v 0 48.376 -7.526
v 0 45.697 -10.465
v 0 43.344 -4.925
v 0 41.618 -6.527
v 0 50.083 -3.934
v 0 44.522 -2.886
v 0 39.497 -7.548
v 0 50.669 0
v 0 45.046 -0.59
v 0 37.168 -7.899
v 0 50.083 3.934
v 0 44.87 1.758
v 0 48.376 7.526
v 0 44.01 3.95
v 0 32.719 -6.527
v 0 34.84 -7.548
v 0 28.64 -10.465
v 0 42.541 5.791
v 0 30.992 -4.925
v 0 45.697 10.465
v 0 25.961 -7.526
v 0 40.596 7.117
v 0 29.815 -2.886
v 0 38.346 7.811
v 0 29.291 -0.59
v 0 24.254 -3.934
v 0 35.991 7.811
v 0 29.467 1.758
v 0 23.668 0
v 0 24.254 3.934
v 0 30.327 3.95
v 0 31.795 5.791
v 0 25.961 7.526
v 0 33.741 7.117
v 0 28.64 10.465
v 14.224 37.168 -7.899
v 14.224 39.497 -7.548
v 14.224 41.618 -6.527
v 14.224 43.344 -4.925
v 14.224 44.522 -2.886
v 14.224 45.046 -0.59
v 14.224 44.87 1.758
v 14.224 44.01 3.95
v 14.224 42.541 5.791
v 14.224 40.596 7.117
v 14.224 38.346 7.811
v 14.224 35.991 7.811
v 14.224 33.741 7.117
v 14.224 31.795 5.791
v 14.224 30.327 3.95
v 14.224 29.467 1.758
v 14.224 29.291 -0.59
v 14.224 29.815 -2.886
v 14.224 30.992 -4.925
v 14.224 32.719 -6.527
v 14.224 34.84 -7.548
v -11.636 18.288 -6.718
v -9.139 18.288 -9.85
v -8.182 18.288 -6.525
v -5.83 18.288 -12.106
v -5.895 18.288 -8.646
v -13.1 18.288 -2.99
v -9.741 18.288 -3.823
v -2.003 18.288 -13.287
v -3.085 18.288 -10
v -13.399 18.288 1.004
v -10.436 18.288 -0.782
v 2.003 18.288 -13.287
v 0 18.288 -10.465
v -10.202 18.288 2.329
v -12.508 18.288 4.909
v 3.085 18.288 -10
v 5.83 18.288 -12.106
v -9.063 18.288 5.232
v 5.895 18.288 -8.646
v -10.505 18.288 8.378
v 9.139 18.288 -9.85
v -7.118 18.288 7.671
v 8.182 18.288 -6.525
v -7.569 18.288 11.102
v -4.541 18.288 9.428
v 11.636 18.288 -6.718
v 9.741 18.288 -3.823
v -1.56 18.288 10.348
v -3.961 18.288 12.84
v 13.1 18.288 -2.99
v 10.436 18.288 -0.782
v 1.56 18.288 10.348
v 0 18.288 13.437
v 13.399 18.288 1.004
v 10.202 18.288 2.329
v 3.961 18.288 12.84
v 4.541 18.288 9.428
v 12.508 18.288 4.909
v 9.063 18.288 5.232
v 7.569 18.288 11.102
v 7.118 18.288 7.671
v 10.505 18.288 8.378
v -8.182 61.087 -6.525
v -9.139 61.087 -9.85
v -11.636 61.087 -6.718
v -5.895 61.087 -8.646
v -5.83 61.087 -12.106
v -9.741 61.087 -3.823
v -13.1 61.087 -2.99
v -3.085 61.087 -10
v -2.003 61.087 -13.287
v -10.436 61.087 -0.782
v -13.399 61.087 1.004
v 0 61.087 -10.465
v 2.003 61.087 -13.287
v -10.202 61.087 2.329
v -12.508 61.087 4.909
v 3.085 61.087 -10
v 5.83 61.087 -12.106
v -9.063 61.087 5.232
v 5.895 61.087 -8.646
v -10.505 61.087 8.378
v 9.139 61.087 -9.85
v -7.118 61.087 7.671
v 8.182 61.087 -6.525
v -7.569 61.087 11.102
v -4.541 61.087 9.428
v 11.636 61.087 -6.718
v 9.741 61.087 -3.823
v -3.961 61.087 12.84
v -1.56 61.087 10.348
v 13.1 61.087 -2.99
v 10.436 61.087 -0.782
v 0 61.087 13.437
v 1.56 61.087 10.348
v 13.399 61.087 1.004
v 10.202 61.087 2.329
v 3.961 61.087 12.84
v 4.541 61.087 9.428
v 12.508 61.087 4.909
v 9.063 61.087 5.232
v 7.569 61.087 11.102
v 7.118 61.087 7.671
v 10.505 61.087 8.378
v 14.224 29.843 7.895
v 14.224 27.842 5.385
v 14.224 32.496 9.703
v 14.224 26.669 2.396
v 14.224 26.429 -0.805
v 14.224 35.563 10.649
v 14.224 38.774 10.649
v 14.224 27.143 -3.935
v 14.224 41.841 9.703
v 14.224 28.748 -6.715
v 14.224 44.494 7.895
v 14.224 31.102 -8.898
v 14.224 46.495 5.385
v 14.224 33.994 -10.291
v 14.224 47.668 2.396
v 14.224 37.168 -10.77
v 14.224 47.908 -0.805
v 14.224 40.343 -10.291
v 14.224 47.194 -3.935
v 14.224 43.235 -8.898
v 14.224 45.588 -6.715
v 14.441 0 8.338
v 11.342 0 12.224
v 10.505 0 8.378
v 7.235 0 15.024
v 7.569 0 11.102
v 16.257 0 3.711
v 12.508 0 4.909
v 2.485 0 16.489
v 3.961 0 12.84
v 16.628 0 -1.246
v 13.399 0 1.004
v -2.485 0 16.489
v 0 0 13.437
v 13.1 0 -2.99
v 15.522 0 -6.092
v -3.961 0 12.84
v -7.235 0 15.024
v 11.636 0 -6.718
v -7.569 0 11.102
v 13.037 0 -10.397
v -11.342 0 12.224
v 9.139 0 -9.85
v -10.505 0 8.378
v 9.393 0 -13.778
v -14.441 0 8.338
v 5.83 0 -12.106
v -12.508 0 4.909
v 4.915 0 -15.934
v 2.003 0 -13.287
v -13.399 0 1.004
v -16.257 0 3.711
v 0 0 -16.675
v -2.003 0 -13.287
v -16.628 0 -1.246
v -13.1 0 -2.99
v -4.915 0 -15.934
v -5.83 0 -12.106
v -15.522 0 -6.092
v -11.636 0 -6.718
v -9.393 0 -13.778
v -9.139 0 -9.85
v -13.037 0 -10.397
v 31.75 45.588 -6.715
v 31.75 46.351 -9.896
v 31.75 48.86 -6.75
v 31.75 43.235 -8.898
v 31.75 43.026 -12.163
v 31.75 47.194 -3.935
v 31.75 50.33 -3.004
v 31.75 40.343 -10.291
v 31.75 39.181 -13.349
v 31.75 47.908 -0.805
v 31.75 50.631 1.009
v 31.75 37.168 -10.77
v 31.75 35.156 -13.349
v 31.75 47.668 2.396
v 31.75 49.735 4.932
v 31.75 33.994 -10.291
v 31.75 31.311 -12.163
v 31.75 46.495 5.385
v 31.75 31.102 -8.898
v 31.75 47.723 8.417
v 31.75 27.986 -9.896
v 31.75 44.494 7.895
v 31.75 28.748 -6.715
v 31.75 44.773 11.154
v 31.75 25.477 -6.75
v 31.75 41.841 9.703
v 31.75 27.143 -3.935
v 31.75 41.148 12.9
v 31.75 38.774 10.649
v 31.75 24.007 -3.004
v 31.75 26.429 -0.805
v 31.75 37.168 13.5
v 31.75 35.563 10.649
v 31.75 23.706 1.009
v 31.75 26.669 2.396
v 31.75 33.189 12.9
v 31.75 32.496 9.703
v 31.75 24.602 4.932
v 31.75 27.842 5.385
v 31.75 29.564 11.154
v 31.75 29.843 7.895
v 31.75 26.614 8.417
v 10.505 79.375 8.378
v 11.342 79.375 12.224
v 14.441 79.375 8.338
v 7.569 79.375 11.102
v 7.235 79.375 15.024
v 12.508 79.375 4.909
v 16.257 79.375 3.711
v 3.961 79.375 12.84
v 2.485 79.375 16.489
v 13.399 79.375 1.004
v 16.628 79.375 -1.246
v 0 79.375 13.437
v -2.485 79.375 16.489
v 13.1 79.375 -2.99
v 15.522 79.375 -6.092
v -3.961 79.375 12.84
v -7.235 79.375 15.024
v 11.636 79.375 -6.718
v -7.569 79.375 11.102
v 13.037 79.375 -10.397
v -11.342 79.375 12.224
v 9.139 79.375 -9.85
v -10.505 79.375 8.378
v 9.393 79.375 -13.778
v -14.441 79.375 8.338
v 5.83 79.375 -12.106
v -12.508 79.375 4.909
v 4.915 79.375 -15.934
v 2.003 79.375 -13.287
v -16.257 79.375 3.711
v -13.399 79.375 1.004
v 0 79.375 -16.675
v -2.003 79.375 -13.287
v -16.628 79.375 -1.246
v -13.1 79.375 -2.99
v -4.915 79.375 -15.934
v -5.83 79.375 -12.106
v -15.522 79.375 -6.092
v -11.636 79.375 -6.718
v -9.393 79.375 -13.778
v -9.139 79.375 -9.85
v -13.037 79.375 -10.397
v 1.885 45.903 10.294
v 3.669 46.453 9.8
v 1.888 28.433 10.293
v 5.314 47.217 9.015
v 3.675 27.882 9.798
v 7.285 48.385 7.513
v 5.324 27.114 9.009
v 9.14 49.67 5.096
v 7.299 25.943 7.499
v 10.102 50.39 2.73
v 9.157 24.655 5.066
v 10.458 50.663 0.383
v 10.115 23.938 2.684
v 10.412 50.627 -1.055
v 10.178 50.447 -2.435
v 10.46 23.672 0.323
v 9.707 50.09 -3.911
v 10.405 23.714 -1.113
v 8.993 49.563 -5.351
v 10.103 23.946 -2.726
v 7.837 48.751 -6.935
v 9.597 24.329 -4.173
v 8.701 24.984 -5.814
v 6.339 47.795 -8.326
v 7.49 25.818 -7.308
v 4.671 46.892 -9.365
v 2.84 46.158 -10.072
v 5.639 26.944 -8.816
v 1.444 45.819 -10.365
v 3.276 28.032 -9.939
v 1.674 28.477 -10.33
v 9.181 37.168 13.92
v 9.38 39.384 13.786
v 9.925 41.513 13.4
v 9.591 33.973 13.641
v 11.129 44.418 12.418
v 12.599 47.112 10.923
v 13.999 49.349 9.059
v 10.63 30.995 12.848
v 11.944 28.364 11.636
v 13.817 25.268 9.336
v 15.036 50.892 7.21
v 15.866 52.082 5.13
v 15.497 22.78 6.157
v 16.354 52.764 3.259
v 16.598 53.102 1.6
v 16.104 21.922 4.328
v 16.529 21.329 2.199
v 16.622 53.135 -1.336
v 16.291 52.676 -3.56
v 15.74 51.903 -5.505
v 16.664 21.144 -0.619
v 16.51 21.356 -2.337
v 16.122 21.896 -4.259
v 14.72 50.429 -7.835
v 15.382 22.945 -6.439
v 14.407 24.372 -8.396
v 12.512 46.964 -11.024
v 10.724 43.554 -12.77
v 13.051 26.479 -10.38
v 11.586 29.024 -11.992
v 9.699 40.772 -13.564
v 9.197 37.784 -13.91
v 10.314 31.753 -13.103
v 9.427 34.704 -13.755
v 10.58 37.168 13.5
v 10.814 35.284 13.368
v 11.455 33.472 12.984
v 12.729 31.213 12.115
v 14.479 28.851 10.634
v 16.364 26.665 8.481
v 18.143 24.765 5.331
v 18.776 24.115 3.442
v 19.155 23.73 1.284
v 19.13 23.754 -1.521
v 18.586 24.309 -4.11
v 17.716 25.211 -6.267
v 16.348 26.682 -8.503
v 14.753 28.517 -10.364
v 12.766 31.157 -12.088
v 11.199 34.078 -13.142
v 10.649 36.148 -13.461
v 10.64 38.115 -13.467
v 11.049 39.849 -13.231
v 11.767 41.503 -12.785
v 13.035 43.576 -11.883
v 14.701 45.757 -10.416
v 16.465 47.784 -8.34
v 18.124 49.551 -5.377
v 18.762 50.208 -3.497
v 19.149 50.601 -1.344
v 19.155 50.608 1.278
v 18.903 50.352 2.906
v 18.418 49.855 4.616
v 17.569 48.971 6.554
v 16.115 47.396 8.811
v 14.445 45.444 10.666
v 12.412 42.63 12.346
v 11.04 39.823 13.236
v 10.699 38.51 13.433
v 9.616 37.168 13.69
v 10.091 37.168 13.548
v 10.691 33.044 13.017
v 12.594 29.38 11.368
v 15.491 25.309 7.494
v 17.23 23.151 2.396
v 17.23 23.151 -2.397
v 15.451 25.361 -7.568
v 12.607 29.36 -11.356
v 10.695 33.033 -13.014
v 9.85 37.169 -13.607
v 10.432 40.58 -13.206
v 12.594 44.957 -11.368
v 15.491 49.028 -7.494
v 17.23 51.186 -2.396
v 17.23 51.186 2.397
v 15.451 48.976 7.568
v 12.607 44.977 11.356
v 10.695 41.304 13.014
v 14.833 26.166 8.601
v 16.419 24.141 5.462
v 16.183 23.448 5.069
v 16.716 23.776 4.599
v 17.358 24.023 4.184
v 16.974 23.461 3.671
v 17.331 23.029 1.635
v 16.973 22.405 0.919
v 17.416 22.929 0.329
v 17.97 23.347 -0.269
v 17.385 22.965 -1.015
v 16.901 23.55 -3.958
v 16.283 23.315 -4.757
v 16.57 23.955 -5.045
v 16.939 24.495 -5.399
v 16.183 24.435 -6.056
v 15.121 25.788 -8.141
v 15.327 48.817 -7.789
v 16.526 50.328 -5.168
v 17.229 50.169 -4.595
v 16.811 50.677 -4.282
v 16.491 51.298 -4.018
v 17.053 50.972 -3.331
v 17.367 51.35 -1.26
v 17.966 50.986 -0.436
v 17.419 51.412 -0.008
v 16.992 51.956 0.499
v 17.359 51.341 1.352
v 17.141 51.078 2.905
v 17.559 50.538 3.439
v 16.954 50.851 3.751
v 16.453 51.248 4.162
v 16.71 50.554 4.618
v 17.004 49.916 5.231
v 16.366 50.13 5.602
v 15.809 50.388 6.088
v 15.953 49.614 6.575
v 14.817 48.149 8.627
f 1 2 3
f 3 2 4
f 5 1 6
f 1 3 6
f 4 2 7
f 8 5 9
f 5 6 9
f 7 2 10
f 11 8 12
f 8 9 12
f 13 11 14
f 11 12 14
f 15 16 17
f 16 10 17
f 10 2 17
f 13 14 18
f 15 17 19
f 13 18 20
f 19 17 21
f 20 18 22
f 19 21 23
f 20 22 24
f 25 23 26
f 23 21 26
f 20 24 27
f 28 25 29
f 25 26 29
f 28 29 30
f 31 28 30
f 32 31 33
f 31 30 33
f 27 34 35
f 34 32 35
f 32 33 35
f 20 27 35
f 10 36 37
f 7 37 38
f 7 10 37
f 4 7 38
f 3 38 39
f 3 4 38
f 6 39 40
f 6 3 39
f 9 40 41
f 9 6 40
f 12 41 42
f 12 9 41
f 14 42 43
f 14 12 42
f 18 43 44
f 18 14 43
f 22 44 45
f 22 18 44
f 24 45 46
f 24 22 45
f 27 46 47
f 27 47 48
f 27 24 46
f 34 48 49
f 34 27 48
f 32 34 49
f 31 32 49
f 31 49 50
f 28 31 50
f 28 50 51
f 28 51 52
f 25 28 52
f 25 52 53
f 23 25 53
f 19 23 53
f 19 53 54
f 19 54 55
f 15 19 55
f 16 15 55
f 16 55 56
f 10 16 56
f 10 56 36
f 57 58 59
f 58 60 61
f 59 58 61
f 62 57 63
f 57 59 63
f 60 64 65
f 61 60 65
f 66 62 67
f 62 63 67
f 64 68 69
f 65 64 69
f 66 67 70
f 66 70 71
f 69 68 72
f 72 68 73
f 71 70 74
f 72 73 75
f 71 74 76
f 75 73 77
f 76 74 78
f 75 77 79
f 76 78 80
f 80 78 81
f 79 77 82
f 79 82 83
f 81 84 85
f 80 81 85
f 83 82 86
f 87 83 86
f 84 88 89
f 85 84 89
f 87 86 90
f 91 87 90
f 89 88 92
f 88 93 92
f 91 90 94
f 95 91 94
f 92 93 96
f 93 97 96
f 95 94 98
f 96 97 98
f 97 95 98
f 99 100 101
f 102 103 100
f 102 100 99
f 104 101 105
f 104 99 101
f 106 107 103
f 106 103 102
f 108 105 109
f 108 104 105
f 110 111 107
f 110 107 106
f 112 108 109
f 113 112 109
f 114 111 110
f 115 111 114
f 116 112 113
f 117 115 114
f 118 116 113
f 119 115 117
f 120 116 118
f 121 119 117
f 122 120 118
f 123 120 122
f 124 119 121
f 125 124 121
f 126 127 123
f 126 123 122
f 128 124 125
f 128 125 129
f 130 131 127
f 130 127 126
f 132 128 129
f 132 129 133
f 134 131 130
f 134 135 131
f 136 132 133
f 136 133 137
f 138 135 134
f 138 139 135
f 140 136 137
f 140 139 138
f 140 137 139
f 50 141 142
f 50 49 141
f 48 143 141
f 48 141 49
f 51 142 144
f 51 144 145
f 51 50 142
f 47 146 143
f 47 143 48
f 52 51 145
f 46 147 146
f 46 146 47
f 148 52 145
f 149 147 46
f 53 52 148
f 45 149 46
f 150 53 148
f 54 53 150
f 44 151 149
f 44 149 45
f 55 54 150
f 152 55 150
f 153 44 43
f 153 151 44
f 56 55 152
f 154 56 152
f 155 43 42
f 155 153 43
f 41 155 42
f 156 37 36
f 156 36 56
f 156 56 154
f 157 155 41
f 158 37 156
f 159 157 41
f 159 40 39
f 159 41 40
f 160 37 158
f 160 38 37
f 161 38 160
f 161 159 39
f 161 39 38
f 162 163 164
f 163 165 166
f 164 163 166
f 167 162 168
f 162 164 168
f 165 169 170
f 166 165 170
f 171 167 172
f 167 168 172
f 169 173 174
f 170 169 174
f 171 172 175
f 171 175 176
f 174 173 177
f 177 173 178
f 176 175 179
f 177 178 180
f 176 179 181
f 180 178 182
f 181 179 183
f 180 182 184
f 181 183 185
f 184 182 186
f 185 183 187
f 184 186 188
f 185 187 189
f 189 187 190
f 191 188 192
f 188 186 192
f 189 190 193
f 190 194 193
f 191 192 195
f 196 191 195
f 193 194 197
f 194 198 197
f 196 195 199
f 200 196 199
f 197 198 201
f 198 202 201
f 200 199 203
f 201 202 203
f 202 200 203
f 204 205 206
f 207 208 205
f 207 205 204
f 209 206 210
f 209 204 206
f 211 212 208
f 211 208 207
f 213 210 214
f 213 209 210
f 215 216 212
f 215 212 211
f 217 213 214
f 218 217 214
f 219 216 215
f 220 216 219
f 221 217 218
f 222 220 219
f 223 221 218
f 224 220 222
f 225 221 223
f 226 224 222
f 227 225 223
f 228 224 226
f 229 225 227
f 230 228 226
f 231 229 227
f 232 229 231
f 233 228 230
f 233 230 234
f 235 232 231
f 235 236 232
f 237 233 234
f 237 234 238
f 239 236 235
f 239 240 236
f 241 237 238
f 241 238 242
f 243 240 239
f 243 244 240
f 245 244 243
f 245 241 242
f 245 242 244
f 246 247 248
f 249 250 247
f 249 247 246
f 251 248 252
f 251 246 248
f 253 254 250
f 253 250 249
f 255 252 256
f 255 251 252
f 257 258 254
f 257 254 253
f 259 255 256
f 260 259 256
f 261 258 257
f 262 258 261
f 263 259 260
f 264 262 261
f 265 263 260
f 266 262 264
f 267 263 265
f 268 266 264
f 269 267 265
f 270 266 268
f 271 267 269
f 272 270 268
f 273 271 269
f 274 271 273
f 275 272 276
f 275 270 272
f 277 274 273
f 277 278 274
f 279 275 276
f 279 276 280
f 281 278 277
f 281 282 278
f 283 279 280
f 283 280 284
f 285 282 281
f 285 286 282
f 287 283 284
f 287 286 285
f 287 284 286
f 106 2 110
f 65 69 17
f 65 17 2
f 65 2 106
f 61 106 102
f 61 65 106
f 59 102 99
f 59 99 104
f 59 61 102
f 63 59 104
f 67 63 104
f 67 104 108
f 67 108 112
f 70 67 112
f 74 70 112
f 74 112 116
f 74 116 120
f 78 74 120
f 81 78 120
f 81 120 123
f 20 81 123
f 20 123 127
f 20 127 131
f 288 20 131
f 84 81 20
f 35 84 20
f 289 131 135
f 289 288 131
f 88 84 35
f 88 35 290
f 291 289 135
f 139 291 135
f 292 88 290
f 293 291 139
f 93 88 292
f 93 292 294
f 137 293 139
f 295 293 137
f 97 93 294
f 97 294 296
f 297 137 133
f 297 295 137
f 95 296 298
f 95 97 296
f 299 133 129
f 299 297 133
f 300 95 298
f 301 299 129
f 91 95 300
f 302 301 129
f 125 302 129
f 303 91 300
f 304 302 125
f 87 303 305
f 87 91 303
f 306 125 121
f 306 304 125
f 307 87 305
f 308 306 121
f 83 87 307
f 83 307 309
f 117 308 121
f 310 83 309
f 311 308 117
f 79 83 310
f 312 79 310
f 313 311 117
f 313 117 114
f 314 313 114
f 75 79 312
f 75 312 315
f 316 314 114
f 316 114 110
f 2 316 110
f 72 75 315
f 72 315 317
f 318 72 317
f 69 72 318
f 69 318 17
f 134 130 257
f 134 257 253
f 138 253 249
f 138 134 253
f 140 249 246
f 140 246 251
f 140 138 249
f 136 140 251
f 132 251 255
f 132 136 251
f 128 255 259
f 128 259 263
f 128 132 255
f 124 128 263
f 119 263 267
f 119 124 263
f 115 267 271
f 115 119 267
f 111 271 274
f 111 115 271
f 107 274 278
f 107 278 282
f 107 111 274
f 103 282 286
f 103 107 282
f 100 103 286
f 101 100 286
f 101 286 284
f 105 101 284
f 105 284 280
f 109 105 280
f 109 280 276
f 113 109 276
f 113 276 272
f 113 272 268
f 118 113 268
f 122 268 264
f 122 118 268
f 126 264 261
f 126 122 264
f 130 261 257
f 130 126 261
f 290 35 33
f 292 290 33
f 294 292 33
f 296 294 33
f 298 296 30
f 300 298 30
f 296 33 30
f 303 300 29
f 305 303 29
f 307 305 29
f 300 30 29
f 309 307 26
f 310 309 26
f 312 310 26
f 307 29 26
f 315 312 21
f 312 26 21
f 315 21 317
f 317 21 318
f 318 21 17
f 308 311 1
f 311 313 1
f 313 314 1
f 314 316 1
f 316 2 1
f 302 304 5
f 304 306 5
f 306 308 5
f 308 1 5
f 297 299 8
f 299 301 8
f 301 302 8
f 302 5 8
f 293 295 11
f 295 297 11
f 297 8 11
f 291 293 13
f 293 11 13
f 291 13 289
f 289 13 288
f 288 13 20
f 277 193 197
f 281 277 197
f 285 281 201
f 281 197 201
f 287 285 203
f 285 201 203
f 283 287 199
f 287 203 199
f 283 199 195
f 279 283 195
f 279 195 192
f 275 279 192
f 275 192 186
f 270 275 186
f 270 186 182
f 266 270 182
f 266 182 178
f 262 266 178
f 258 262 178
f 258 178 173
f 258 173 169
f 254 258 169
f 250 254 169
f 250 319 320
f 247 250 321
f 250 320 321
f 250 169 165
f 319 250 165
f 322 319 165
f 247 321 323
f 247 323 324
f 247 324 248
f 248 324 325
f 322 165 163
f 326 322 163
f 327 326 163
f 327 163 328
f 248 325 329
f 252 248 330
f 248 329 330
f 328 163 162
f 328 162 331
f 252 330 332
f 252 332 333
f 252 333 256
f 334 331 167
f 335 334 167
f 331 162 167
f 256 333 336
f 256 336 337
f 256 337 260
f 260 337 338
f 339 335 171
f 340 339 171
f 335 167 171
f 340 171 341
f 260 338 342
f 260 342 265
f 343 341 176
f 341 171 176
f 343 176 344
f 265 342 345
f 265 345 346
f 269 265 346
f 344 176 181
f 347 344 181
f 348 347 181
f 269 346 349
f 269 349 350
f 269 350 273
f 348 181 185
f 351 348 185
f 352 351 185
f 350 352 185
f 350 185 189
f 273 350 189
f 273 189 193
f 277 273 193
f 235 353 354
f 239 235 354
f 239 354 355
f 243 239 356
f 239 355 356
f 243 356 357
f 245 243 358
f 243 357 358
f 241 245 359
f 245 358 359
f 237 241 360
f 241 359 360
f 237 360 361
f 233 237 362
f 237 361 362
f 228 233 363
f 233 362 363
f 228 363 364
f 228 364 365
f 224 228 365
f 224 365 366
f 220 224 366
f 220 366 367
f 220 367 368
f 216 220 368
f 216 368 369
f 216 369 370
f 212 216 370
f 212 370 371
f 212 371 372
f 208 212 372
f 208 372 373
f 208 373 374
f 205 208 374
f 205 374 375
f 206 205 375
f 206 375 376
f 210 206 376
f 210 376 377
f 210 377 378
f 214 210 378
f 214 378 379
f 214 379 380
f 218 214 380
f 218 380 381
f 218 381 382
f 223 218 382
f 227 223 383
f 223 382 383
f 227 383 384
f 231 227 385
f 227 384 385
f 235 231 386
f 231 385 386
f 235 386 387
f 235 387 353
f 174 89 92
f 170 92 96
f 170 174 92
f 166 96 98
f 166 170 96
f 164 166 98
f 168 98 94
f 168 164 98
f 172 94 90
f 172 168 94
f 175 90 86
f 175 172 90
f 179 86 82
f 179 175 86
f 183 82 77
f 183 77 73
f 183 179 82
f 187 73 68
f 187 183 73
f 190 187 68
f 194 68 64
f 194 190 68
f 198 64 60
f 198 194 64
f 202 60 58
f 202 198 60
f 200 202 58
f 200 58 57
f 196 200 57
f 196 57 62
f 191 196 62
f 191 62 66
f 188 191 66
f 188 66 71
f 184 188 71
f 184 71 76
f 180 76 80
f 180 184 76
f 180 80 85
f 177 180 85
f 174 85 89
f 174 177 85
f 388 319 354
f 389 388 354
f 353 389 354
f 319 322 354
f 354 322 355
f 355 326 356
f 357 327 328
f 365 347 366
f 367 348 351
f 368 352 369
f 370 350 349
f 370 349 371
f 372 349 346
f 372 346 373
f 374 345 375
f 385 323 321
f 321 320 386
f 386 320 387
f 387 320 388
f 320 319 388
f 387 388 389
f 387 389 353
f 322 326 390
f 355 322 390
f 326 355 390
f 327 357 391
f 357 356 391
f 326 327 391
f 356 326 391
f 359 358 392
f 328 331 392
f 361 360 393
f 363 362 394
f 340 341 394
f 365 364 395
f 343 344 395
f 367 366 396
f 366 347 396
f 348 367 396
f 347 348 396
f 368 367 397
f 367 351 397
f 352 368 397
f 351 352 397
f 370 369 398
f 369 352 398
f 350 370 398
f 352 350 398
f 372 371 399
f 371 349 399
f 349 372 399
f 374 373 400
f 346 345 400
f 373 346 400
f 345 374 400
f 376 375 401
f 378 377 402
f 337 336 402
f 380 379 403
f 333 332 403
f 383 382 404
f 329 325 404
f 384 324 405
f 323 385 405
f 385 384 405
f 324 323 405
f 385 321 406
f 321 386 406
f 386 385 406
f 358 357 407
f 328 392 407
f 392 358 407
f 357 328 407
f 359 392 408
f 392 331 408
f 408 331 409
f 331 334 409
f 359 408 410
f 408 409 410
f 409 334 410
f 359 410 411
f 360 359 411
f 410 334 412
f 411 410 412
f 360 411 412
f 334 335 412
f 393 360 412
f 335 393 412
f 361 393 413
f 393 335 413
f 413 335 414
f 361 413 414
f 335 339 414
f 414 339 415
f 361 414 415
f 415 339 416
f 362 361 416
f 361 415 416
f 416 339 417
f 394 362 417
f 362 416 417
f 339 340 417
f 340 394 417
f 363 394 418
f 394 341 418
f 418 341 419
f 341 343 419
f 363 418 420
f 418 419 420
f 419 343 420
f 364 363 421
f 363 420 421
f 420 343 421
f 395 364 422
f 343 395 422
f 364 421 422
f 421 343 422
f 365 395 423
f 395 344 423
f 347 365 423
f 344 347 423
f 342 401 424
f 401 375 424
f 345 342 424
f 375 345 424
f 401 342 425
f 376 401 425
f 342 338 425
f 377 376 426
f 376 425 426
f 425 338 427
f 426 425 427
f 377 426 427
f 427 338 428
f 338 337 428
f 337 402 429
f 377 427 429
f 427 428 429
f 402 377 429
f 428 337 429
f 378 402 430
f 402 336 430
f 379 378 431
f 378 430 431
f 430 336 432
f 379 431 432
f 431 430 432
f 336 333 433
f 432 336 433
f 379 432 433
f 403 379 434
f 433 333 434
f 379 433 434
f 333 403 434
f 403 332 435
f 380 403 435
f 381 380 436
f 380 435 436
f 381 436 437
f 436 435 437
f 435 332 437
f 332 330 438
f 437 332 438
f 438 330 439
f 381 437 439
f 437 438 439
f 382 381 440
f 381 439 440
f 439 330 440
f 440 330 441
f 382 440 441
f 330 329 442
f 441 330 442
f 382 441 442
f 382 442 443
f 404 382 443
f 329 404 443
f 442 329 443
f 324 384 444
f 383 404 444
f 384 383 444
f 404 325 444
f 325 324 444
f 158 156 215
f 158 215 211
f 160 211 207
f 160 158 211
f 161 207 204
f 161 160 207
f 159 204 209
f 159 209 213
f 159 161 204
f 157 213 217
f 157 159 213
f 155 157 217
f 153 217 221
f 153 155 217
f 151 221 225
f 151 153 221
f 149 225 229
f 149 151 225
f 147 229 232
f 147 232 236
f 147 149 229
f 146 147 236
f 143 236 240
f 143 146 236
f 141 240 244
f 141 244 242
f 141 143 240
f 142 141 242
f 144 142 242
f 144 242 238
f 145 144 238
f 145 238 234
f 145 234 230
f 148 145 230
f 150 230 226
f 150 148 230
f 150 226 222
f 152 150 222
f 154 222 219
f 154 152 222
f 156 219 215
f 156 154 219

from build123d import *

# Parameters (mm, degrees)
SKETCH1_R               = 16.6751
BOSS_EXTRUDE1_DEPTH     = 79.375
CUT_EXTRUDE1_DEPTH      = 83.804037009
CUT_EXTRUDE1_DEPTH_BACK = 83.804037009
SKETCH1_4_R             = 10.4648
SKETCH1_5_R             = 13.4366
SKETCH1_5_R_2           = 10.4648
CUT_EXTRUDE2_DEPTH      = 18.288
CUT_EXTRUDE3_START      = -18.288
SKETCH2_R               = 13.4366
SKETCH2_R_2             = 10.4648
CUT_EXTRUDE3_DEPTH      = 18.288
SKETCH3_R               = 13.5001
BOSS_EXTRUDE2_DEPTH     = 31.75
SKETCH3_7_R             = 7.8994
CUT_EXTRUDE5_DEPTH      = 33.3502
CUT_EXTRUDE6_START      = -17.526
SKETCH4_R               = 10.7696
SKETCH4_R_2             = 7.8994
CUT_EXTRUDE6_DEPTH      = 17.526
FILLET1_R               = 2.54


with BuildPart() as part:
    # Sketch1 → Boss-Extrude1 (new body)
    with BuildSketch(Plane(origin=(0, 0, 0), x_dir=(1, 0, 0), z_dir=(0, 1, 0))):
        with Locations(Location((0, 0, 0), (0, 0, 90))):
            Circle(SKETCH1_R)
    extrude(amount=BOSS_EXTRUDE1_DEPTH)

    # Sketch1<4> → Cut-Extrude1 (cut, two sides: drawn at the far end of the back side and taken through both)
    with BuildSketch(Plane(origin=(0, 0, 0), x_dir=(1, 0, 0), z_dir=(0, 1, 0)).offset(-CUT_EXTRUDE1_DEPTH_BACK)):
        with Locations(Location((0, 0, 0), (0, 0, 90))):
            Circle(SKETCH1_4_R)
    extrude(amount=CUT_EXTRUDE1_DEPTH + CUT_EXTRUDE1_DEPTH_BACK, mode=Mode.SUBTRACT)

    # Sketch1<5> → Cut-Extrude2 (cut)
    with BuildSketch(Plane(origin=(0, 0, 0), x_dir=(1, 0, 0), z_dir=(0, 1, 0))):
        with Locations(Location((0, 0, 0), (0, 0, 270))):
            Circle(SKETCH1_5_R)
        with Locations(Location((0, 0, 0), (0, 0, 90))):
            Circle(SKETCH1_5_R_2, mode=Mode.SUBTRACT)
    extrude(amount=CUT_EXTRUDE2_DEPTH, mode=Mode.SUBTRACT)

    # Sketch2 → Cut-Extrude3 (cut)
    with BuildSketch(Plane(origin=(0, 79.375, 0), x_dir=(1, 0, 0), z_dir=(0, 1, 0)).offset(CUT_EXTRUDE3_START)):
        with Locations(Location((0, 0, 0), (0, 0, 270))):
            Circle(SKETCH2_R)
        with Locations(Location((0, 0, 0), (0, 0, 90))):
            Circle(SKETCH2_R_2, mode=Mode.SUBTRACT)
    extrude(amount=CUT_EXTRUDE3_DEPTH, mode=Mode.SUBTRACT)

    # Sketch3 → Boss-Extrude2 (add)
    with BuildSketch(Plane(origin=(0, 0, 0), x_dir=(0, 0, -1), z_dir=(1, 0, 0))):
        with Locations(Location((0, 37.168433559, 0), (0, 0, 180))):
            Circle(SKETCH3_R)
    extrude(amount=BOSS_EXTRUDE2_DEPTH)

    # Sketch3<7> → Cut-Extrude5 (cut)
    with BuildSketch(Plane(origin=(0, 0, 0), x_dir=(0, 0, -1), z_dir=(1, 0, 0))):
        with Locations((0, 37.168433559)):
            Circle(SKETCH3_7_R)
    extrude(amount=CUT_EXTRUDE5_DEPTH, mode=Mode.SUBTRACT)

    # Sketch4 → Cut-Extrude6 (cut)
    with BuildSketch(Plane(origin=(31.75, 0, 0), x_dir=(0, 0, -1), z_dir=(1, 0, 0)).offset(CUT_EXTRUDE6_START)):
        with Locations((0, 37.168433559)):
            Circle(SKETCH4_R)
        with Locations((0, 37.168433559)):
            Circle(SKETCH4_R_2, mode=Mode.SUBTRACT)
    extrude(amount=CUT_EXTRUDE6_DEPTH, mode=Mode.SUBTRACT)

    # Fillet1
    fillet1_edges = [part.edges().sort_by_distance(p)[0] for p in [
        (9.788067225, 37.168433559, -13.5001),
    ]]
    fillet(fillet1_edges, radius=FILLET1_R)


solid = part.part
